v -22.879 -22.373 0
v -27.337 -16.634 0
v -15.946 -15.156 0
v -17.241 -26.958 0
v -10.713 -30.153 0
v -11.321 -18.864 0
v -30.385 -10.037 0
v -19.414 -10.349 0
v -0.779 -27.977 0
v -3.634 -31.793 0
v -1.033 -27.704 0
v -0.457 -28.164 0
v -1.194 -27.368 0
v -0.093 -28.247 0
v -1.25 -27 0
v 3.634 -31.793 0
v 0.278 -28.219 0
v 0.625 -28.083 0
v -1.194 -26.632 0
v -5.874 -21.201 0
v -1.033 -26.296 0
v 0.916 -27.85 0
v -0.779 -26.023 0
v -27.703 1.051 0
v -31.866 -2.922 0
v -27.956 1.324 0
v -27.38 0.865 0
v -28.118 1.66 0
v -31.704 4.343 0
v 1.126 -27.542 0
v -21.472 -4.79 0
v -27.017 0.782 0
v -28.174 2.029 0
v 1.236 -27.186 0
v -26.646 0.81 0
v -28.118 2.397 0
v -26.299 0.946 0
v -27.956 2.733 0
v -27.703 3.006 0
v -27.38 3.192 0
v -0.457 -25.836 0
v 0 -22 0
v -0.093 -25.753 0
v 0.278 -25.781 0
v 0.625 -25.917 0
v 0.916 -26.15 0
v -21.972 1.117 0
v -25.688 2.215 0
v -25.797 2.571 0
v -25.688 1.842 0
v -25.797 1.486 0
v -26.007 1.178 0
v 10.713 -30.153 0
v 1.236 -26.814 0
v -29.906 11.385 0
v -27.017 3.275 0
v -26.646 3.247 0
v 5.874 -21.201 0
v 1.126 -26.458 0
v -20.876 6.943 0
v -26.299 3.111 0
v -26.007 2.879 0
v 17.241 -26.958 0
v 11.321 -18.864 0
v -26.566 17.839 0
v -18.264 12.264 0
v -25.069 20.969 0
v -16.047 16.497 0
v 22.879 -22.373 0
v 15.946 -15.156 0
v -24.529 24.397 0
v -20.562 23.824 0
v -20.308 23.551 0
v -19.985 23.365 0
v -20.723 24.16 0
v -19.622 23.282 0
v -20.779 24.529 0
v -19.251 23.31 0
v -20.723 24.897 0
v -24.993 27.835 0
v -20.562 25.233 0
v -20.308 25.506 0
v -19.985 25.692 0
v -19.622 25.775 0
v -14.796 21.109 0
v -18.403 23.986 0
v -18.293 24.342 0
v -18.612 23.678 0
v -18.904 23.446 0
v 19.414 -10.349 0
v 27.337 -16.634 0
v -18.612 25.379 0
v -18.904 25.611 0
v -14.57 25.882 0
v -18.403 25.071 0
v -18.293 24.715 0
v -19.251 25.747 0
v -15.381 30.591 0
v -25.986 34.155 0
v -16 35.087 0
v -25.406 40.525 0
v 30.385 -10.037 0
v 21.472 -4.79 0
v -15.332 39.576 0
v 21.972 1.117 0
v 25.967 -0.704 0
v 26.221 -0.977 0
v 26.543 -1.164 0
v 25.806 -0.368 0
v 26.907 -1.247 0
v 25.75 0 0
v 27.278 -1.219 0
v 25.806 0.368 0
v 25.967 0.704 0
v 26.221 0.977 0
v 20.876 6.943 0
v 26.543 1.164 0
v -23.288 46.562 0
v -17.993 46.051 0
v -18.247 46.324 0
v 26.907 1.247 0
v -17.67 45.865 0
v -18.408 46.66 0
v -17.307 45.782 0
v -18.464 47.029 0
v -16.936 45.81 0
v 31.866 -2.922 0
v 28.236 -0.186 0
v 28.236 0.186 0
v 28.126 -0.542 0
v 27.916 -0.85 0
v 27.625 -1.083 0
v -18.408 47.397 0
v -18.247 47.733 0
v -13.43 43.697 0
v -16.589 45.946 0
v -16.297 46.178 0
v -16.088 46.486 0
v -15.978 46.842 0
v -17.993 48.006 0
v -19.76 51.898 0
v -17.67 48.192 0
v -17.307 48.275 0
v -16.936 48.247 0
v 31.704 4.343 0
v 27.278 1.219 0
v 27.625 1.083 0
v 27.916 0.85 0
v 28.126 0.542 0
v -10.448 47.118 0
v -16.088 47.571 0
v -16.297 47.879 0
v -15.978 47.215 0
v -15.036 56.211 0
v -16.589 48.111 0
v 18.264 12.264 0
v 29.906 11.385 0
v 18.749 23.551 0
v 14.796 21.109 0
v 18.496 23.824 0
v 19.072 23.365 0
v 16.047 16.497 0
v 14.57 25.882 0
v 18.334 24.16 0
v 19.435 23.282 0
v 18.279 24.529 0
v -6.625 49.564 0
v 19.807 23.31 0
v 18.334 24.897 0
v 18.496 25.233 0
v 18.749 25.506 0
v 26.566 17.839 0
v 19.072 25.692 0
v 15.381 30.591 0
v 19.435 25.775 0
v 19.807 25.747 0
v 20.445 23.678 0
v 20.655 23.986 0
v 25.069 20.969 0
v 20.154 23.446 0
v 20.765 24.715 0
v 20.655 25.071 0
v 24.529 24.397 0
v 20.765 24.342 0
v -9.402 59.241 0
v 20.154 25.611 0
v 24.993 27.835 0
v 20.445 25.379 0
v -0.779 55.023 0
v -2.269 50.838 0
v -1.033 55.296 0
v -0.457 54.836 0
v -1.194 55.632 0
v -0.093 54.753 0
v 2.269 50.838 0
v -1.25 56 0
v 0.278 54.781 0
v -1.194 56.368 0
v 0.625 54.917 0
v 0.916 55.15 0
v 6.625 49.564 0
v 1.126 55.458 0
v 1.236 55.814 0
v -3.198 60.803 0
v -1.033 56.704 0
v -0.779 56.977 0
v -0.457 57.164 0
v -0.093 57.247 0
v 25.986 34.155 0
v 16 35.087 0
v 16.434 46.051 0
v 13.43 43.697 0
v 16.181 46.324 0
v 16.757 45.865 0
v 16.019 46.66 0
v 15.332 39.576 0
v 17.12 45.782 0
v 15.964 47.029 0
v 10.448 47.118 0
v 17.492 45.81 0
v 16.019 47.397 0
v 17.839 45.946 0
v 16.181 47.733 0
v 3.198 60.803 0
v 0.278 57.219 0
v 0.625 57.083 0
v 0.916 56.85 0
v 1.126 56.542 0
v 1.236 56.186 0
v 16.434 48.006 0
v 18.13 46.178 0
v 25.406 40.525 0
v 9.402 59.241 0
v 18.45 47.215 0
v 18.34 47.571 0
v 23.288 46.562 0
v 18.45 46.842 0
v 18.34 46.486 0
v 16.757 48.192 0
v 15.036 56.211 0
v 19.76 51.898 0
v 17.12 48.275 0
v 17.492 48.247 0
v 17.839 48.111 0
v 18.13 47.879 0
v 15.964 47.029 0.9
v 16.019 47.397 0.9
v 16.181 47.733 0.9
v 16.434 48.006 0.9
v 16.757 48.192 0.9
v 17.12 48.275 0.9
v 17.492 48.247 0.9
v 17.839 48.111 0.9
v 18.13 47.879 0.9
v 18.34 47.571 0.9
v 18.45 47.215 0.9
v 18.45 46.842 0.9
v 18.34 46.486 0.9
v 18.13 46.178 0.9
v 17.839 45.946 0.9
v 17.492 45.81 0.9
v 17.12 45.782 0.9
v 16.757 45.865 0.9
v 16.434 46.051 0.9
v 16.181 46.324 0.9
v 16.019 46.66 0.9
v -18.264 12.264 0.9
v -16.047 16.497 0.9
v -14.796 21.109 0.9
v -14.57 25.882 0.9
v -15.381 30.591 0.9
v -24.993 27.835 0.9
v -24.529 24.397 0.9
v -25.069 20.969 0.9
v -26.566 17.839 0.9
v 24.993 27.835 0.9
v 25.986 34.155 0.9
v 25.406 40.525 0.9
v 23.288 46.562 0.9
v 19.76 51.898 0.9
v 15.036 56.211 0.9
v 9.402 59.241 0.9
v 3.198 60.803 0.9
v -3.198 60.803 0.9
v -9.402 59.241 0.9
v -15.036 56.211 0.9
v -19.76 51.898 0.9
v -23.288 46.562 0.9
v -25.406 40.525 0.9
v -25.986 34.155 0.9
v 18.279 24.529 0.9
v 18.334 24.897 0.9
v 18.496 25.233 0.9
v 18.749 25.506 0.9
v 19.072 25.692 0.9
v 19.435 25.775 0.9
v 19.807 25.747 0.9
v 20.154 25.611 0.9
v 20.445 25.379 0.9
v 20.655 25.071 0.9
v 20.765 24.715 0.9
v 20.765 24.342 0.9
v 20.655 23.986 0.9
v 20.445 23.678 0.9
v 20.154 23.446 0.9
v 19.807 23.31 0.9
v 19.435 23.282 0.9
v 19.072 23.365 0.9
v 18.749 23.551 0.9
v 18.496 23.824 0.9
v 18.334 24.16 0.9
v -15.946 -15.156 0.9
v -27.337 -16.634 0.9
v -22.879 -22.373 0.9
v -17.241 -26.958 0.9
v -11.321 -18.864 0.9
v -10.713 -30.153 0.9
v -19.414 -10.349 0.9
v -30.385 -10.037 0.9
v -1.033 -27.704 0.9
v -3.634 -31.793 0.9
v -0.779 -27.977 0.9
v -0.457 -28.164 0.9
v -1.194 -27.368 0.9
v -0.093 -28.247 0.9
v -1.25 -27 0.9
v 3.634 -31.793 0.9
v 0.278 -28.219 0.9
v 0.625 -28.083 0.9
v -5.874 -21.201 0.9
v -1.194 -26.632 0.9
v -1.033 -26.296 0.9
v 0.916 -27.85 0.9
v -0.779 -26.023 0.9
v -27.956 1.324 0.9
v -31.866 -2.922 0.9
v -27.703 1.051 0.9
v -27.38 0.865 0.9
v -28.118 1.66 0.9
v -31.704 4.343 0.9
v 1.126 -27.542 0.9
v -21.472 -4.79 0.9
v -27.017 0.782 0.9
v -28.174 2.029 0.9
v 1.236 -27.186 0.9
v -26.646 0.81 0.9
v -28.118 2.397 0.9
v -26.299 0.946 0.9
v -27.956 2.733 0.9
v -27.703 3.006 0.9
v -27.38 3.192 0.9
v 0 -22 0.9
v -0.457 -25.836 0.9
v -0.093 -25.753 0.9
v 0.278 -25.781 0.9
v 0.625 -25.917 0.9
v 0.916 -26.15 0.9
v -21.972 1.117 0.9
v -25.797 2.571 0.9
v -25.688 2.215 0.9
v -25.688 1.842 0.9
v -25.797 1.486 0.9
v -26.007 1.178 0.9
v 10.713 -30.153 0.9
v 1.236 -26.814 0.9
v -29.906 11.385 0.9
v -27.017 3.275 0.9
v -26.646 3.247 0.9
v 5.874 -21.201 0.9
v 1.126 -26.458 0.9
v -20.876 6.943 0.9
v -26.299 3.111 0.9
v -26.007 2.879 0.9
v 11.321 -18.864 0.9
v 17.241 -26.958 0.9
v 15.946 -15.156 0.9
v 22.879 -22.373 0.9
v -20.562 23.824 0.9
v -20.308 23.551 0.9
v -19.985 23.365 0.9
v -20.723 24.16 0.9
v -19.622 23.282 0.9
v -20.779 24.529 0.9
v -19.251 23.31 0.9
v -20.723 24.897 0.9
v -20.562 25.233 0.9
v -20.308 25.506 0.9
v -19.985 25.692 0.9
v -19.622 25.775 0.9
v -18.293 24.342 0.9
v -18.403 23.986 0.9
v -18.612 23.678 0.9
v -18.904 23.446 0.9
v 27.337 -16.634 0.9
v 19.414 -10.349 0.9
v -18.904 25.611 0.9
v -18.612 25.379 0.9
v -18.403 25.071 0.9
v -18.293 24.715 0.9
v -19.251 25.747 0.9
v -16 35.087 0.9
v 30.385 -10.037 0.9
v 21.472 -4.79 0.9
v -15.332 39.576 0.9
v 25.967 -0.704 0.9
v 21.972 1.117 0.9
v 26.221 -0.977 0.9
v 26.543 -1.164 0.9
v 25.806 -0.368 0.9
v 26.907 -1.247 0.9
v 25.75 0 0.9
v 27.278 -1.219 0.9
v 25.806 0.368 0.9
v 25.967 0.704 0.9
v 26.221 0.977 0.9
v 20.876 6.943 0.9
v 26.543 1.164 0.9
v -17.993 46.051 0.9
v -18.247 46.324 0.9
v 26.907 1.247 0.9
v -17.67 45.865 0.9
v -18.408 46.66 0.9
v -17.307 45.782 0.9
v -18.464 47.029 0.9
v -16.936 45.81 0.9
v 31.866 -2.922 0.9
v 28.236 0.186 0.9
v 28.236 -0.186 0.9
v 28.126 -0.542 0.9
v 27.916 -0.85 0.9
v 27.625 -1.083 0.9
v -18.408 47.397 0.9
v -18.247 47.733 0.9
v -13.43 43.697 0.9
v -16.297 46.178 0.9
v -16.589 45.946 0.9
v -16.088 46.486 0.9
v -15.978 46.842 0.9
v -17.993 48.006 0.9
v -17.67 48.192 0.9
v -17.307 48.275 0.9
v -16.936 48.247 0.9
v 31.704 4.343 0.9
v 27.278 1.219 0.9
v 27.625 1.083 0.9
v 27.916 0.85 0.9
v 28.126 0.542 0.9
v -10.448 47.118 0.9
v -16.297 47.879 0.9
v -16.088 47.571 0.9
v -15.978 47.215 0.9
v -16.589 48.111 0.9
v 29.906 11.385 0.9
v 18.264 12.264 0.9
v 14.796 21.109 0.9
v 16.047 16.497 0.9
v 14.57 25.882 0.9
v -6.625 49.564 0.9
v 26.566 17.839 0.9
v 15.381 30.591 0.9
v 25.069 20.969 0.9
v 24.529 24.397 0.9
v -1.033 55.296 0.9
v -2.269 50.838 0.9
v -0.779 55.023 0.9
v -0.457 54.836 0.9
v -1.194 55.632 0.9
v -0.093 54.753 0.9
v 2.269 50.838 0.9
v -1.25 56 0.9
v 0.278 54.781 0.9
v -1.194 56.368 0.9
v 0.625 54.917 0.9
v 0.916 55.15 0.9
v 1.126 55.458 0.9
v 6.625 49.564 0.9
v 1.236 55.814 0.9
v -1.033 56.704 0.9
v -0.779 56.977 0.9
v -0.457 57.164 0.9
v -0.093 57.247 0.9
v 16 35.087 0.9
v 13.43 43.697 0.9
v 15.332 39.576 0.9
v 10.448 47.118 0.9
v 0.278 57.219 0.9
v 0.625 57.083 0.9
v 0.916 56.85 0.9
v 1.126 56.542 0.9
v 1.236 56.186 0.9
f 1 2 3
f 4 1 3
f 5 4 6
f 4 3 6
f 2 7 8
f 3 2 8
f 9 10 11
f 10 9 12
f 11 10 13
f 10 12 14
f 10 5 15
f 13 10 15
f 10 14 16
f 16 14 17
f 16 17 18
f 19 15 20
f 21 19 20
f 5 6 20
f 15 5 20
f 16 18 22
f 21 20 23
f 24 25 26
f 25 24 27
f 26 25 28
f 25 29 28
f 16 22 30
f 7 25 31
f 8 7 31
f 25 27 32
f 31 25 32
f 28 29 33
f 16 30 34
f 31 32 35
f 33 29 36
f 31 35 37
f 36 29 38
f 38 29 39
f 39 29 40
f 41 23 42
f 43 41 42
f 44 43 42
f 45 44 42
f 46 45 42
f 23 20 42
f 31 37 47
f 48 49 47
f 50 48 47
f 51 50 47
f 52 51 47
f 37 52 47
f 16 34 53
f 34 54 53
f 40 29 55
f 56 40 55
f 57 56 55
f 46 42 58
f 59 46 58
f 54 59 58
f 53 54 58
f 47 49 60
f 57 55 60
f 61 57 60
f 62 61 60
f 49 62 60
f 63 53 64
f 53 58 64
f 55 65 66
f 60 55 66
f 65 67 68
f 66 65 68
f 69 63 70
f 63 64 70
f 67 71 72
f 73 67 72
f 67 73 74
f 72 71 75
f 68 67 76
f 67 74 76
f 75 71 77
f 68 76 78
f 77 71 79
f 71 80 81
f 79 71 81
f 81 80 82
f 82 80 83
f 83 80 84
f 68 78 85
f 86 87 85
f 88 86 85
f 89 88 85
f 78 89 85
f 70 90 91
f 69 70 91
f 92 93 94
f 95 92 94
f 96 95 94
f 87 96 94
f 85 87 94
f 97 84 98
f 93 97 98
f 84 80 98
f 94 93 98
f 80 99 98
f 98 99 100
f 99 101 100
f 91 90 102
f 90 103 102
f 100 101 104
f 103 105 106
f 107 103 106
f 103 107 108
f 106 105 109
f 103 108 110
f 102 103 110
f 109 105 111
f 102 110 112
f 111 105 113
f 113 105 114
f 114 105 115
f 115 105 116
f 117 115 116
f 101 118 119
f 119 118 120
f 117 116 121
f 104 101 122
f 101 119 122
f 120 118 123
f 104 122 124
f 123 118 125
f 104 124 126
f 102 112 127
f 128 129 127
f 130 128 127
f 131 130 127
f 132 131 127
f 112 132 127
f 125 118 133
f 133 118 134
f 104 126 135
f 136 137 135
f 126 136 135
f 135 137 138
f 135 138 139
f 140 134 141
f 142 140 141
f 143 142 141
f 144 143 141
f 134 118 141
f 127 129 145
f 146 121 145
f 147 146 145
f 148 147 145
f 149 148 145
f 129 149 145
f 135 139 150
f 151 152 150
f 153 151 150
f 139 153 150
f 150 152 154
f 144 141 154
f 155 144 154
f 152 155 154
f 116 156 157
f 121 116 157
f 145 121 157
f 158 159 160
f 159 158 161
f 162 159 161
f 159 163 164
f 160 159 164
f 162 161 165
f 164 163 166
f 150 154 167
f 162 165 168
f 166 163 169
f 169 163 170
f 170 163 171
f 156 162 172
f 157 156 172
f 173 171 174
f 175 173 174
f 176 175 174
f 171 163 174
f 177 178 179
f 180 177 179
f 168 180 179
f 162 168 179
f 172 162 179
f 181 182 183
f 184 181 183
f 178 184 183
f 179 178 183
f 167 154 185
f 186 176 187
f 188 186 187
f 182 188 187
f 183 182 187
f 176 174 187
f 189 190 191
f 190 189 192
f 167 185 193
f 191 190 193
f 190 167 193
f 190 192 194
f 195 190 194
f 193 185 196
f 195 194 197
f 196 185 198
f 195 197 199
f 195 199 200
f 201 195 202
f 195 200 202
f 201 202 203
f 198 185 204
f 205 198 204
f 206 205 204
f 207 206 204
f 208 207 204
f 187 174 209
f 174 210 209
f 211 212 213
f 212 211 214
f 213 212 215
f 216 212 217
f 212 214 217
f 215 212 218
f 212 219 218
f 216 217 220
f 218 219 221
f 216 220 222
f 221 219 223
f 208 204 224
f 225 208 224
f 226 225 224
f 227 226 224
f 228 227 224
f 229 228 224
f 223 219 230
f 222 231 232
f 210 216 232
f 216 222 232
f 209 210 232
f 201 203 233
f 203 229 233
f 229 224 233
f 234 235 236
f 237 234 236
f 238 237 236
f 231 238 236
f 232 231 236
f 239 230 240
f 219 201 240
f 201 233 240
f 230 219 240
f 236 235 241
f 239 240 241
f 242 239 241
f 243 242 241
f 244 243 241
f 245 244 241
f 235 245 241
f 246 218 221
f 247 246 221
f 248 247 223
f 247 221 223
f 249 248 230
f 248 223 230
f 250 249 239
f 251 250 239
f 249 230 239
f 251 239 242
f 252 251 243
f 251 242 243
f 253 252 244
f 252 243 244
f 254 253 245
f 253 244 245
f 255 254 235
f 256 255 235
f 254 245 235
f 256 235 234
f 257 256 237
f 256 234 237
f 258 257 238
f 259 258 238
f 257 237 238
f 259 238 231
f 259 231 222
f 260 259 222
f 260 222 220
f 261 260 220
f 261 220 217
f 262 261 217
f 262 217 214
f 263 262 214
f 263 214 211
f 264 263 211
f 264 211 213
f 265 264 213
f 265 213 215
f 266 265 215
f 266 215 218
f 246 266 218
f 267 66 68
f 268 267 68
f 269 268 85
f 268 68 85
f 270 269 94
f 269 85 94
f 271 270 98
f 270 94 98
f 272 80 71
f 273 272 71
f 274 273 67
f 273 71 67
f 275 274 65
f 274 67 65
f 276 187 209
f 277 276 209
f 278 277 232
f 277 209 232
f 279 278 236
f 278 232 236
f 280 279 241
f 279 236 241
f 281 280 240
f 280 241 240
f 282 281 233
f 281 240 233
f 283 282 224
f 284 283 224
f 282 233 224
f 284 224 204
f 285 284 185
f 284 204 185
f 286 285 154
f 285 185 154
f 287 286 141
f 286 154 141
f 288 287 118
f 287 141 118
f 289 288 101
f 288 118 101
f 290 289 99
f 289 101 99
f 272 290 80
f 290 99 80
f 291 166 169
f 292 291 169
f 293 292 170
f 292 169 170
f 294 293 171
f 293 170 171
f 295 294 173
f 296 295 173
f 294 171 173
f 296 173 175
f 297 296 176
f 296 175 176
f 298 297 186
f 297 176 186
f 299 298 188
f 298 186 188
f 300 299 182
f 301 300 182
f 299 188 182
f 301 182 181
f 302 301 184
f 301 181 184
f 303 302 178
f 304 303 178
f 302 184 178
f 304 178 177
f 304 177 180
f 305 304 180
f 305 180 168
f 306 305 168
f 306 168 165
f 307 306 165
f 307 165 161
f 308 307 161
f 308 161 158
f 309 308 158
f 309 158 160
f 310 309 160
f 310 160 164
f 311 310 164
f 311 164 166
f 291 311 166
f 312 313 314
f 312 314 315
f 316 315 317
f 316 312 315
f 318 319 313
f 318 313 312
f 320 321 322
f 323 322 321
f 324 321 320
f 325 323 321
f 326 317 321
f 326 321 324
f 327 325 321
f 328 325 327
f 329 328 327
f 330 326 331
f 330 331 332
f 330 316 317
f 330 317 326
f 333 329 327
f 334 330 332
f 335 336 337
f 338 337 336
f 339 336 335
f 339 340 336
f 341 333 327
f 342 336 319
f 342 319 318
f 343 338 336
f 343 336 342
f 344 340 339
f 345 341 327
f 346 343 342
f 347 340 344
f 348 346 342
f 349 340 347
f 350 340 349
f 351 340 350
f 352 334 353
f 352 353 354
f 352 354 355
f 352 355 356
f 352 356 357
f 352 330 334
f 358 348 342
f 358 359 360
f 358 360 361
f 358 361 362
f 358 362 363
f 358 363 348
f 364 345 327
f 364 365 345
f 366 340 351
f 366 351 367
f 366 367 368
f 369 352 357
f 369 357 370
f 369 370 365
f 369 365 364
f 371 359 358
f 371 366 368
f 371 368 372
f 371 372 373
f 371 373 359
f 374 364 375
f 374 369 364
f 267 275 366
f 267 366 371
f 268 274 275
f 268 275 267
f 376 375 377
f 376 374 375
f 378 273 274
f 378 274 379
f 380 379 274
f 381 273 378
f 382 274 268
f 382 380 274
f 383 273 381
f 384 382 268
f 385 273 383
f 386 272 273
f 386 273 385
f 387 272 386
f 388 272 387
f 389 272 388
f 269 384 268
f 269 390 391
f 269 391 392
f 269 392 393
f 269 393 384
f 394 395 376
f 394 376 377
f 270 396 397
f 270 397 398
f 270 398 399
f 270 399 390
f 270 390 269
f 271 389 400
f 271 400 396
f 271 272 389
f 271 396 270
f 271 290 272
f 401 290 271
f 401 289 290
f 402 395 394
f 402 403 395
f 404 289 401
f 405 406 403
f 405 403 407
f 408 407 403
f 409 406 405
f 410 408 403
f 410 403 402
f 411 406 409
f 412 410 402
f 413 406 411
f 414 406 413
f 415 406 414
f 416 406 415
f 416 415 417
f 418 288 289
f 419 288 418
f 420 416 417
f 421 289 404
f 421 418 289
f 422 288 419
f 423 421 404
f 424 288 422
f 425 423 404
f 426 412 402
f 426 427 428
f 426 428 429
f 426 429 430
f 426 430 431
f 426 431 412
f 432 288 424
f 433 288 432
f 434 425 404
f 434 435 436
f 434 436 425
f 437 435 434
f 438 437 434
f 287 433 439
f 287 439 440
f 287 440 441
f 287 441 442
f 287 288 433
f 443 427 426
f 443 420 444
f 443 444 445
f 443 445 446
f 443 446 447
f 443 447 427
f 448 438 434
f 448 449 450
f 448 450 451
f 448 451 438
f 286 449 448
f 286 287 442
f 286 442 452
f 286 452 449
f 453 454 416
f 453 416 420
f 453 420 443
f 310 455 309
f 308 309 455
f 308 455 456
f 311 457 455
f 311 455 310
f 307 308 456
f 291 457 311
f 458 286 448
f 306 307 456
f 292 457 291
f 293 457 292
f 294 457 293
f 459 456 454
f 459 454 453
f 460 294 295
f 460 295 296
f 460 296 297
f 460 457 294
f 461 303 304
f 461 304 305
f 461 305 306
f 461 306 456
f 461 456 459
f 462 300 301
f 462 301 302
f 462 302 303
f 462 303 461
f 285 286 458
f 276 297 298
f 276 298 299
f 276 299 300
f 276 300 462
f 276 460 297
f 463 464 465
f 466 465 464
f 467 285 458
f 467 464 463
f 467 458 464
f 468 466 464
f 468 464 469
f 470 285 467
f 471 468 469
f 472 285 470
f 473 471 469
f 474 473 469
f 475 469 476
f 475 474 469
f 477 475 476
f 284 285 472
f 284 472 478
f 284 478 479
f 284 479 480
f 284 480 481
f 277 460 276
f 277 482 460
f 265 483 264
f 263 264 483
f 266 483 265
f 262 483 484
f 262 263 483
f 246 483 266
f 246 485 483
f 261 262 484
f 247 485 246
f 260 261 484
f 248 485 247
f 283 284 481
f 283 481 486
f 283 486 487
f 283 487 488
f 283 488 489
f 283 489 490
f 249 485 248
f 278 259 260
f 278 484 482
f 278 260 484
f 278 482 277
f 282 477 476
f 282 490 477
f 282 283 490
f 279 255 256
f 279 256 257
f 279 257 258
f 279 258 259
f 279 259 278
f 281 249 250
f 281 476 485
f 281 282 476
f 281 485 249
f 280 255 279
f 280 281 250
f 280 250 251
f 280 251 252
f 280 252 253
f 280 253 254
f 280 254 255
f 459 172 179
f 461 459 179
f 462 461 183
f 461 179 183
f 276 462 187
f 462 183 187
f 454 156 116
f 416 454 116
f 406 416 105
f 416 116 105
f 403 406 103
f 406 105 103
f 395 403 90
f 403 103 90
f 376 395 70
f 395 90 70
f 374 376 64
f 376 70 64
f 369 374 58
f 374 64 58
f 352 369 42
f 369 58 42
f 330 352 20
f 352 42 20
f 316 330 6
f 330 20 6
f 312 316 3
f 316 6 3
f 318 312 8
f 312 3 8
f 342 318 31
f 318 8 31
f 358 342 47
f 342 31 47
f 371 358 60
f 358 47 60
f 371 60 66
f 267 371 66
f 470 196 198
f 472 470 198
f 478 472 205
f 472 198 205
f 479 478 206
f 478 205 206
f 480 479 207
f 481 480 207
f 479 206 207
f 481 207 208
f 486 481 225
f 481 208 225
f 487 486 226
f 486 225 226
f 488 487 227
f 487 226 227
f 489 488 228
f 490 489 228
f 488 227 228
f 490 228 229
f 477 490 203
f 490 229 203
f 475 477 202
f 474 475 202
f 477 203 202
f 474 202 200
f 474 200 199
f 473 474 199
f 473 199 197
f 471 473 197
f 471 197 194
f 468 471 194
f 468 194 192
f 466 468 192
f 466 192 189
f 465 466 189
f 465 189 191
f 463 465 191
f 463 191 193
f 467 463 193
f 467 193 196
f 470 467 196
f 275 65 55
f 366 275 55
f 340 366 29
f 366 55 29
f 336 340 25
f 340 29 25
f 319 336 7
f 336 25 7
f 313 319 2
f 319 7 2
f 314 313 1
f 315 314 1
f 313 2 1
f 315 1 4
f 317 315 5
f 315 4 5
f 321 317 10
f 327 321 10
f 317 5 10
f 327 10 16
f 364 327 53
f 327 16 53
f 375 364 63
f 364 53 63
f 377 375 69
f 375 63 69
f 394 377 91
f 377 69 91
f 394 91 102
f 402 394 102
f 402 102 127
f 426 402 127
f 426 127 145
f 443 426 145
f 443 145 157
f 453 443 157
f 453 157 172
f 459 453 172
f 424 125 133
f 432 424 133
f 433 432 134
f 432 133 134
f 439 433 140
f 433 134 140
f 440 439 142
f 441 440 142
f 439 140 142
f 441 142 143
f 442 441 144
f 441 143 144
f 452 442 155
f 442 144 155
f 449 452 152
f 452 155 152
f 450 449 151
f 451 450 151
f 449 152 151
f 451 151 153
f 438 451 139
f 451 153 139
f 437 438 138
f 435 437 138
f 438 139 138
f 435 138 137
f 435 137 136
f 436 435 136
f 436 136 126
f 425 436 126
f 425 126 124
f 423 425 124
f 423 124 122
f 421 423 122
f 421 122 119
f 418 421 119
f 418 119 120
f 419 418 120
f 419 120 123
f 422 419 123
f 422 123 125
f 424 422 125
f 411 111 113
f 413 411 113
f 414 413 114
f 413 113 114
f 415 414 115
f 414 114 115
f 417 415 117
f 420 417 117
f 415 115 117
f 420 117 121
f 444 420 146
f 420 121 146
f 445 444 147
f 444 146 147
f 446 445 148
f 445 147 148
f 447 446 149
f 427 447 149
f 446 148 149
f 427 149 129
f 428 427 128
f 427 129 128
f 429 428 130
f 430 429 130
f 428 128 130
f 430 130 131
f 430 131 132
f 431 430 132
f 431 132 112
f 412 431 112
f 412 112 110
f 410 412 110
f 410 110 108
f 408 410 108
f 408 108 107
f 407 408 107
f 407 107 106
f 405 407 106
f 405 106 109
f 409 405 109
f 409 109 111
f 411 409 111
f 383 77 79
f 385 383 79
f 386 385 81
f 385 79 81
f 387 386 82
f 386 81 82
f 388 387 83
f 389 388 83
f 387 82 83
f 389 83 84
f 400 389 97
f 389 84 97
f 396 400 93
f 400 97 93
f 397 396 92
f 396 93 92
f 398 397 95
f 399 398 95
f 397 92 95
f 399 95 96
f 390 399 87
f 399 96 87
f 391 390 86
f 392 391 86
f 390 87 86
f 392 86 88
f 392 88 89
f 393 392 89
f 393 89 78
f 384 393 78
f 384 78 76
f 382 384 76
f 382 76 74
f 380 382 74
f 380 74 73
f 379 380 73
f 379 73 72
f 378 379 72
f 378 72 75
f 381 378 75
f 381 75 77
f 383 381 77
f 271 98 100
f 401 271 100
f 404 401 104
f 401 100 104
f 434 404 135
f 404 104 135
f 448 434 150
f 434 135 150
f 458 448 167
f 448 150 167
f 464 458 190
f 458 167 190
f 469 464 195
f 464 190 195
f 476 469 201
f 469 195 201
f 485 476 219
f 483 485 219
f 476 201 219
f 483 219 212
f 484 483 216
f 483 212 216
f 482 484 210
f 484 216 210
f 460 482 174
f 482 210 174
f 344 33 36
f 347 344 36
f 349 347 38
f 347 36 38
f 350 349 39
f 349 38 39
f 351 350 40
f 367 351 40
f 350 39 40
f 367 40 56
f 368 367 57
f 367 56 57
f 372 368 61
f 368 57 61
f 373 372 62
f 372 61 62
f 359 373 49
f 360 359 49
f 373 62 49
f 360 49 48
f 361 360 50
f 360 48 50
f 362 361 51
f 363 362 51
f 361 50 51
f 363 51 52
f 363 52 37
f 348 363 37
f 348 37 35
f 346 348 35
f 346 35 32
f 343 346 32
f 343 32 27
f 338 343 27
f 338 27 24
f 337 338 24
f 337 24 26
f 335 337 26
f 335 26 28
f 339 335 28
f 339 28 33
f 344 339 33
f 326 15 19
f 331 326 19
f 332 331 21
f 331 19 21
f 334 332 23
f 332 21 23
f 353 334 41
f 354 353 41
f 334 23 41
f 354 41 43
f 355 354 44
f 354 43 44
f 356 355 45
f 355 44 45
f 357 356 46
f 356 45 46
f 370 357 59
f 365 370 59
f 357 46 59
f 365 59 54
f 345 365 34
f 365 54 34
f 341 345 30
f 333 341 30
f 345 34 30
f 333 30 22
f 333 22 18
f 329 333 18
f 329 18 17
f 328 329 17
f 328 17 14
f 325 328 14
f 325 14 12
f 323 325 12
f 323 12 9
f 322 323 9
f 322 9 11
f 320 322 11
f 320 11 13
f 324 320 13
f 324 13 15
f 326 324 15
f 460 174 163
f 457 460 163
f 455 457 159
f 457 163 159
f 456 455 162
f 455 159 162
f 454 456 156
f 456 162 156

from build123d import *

# Parameters (mm, degrees)
BOSS_EXTRUDE1_DEPTH = 0.9
M3_TAPPED_HOLE1_D   = 2.5


with BuildPart() as part:
    # Sketch1 → Boss-Extrude1 (new body)
    with BuildSketch(Plane.XY):
        with BuildLine():
            ThreePointArc((-24.993351584, 27.835338346), (-24.67461016, 22.663230671), (-26.566359725, 17.838961039))
            ThreePointArc((-26.566359725, 17.838961039), (0, -32), (26.566359725, 17.838961039))
            ThreePointArc((26.566359725, 17.838961039), (24.67461016, 22.663230671), (24.993351584, 27.835338346))
            ThreePointArc((24.993351584, 27.835338346), (0, 61), (-24.993351584, 27.835338346))
        make_face()
        with BuildLine():
            ThreePointArc((-15.380524051, 30.590977444), (0, 51), (15.380524051, 30.590977444))
            ThreePointArc((15.380524051, 30.590977444), (14.796164774, 21.108780039), (18.264372311, 12.264285714))
            ThreePointArc((18.264372311, 12.264285714), (0, -22), (-18.264372311, 12.264285714))
            ThreePointArc((-18.264372311, 12.264285714), (-14.796164774, 21.108780039), (-15.380524051, 30.590977444))
        make_face(mode=Mode.SUBTRACT)
    extrude(amount=BOSS_EXTRUDE1_DEPTH)

    # M3 Tapped Hole1 (through all)
    with Locations(Plane.XY.offset(0.9)):
        with Locations((27, 0), (19.528744622, 24.528571429), (-19.528744622, 24.528571429), (-26.92368656, 2.028571429), (0, 56), (17.213758142, 47.028571429), (-17.213758142, 47.028571429), (0, -27)):
            Hole(M3_TAPPED_HOLE1_D / 2)


solid = part.part
